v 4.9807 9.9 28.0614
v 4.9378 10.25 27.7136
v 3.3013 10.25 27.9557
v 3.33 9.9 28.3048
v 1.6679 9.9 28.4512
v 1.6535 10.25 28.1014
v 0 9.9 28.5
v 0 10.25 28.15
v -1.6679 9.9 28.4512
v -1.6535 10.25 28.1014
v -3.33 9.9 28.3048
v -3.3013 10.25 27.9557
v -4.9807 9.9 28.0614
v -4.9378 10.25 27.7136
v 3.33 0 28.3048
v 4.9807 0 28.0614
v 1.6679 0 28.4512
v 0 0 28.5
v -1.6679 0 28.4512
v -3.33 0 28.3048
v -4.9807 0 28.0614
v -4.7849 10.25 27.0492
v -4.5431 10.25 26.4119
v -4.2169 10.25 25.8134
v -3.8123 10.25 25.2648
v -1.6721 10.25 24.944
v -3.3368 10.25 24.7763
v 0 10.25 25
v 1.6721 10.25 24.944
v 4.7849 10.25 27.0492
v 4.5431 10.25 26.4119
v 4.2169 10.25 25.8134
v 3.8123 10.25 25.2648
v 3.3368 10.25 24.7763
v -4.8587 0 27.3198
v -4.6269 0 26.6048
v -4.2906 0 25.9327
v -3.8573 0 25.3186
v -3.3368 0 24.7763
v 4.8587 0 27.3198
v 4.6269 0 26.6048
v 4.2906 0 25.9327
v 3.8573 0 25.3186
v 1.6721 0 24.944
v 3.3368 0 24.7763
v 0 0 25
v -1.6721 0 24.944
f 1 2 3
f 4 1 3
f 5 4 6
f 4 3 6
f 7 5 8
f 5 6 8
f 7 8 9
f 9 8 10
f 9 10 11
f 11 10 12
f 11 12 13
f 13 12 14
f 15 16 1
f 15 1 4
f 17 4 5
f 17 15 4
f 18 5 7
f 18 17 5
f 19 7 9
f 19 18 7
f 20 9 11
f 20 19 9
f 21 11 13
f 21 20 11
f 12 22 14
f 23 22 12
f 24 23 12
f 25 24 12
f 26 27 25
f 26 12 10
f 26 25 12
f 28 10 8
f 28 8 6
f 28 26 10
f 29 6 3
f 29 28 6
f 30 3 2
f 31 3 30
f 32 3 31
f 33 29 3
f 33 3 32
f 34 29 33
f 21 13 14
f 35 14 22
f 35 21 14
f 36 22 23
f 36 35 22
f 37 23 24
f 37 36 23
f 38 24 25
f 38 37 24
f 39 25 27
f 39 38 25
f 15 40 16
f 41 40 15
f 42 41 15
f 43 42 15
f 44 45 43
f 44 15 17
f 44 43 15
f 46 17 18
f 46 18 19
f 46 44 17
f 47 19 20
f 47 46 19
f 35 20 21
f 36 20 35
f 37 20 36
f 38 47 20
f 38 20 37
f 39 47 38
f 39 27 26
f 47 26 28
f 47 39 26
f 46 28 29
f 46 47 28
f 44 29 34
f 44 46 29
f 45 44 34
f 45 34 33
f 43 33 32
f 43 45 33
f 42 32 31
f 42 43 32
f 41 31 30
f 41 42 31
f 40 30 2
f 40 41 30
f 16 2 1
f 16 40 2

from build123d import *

# Parameters (mm, degrees)
BOSS_EXTRUDE1_DEPTH = 10.9
CHAMFER1_SIZE       = 1
SKETCH2_R           = 39.716531346
CUT_EXTRUDE1_DEPTH  = 0.65


with BuildPart() as part:
    # Sketch1 → Boss-Extrude1 (new body)
    with BuildSketch(Plane(origin=(0, 0, 0), x_dir=(1, 0, 0), z_dir=(0, 1, 0))):
        with BuildLine():
            ThreePointArc((-3.336791258, -24.776315789), (0, -25), (3.336791258, -24.776315789))
            ThreePointArc((3.336791258, -24.776315789), (4.47137835, -26.262417453), (4.980726164, -28.061403509))
            ThreePointArc((4.980726164, -28.061403509), (0, -28.5), (-4.980726164, -28.061403509))
            ThreePointArc((-4.980726164, -28.061403509), (-4.47137835, -26.262417453), (-3.336791258, -24.776315789))
        make_face()
    extrude(amount=BOSS_EXTRUDE1_DEPTH)

    # Chamfer1
    chamfer1_edges = [part.edges().sort_by_distance(p)[0] for p in [
        (0, 10.9, 28.5),
    ]]
    chamfer(chamfer1_edges, length=CHAMFER1_SIZE)

    # Sketch2 → Cut-Extrude1 (cut)
    with BuildSketch(Plane(origin=(0, 10.9, 0), x_dir=(1, 0, 0), z_dir=(0, 1, 0))):
        Circle(SKETCH2_R)
    extrude(amount=-CUT_EXTRUDE1_DEPTH, mode=Mode.SUBTRACT)


solid = part.part
